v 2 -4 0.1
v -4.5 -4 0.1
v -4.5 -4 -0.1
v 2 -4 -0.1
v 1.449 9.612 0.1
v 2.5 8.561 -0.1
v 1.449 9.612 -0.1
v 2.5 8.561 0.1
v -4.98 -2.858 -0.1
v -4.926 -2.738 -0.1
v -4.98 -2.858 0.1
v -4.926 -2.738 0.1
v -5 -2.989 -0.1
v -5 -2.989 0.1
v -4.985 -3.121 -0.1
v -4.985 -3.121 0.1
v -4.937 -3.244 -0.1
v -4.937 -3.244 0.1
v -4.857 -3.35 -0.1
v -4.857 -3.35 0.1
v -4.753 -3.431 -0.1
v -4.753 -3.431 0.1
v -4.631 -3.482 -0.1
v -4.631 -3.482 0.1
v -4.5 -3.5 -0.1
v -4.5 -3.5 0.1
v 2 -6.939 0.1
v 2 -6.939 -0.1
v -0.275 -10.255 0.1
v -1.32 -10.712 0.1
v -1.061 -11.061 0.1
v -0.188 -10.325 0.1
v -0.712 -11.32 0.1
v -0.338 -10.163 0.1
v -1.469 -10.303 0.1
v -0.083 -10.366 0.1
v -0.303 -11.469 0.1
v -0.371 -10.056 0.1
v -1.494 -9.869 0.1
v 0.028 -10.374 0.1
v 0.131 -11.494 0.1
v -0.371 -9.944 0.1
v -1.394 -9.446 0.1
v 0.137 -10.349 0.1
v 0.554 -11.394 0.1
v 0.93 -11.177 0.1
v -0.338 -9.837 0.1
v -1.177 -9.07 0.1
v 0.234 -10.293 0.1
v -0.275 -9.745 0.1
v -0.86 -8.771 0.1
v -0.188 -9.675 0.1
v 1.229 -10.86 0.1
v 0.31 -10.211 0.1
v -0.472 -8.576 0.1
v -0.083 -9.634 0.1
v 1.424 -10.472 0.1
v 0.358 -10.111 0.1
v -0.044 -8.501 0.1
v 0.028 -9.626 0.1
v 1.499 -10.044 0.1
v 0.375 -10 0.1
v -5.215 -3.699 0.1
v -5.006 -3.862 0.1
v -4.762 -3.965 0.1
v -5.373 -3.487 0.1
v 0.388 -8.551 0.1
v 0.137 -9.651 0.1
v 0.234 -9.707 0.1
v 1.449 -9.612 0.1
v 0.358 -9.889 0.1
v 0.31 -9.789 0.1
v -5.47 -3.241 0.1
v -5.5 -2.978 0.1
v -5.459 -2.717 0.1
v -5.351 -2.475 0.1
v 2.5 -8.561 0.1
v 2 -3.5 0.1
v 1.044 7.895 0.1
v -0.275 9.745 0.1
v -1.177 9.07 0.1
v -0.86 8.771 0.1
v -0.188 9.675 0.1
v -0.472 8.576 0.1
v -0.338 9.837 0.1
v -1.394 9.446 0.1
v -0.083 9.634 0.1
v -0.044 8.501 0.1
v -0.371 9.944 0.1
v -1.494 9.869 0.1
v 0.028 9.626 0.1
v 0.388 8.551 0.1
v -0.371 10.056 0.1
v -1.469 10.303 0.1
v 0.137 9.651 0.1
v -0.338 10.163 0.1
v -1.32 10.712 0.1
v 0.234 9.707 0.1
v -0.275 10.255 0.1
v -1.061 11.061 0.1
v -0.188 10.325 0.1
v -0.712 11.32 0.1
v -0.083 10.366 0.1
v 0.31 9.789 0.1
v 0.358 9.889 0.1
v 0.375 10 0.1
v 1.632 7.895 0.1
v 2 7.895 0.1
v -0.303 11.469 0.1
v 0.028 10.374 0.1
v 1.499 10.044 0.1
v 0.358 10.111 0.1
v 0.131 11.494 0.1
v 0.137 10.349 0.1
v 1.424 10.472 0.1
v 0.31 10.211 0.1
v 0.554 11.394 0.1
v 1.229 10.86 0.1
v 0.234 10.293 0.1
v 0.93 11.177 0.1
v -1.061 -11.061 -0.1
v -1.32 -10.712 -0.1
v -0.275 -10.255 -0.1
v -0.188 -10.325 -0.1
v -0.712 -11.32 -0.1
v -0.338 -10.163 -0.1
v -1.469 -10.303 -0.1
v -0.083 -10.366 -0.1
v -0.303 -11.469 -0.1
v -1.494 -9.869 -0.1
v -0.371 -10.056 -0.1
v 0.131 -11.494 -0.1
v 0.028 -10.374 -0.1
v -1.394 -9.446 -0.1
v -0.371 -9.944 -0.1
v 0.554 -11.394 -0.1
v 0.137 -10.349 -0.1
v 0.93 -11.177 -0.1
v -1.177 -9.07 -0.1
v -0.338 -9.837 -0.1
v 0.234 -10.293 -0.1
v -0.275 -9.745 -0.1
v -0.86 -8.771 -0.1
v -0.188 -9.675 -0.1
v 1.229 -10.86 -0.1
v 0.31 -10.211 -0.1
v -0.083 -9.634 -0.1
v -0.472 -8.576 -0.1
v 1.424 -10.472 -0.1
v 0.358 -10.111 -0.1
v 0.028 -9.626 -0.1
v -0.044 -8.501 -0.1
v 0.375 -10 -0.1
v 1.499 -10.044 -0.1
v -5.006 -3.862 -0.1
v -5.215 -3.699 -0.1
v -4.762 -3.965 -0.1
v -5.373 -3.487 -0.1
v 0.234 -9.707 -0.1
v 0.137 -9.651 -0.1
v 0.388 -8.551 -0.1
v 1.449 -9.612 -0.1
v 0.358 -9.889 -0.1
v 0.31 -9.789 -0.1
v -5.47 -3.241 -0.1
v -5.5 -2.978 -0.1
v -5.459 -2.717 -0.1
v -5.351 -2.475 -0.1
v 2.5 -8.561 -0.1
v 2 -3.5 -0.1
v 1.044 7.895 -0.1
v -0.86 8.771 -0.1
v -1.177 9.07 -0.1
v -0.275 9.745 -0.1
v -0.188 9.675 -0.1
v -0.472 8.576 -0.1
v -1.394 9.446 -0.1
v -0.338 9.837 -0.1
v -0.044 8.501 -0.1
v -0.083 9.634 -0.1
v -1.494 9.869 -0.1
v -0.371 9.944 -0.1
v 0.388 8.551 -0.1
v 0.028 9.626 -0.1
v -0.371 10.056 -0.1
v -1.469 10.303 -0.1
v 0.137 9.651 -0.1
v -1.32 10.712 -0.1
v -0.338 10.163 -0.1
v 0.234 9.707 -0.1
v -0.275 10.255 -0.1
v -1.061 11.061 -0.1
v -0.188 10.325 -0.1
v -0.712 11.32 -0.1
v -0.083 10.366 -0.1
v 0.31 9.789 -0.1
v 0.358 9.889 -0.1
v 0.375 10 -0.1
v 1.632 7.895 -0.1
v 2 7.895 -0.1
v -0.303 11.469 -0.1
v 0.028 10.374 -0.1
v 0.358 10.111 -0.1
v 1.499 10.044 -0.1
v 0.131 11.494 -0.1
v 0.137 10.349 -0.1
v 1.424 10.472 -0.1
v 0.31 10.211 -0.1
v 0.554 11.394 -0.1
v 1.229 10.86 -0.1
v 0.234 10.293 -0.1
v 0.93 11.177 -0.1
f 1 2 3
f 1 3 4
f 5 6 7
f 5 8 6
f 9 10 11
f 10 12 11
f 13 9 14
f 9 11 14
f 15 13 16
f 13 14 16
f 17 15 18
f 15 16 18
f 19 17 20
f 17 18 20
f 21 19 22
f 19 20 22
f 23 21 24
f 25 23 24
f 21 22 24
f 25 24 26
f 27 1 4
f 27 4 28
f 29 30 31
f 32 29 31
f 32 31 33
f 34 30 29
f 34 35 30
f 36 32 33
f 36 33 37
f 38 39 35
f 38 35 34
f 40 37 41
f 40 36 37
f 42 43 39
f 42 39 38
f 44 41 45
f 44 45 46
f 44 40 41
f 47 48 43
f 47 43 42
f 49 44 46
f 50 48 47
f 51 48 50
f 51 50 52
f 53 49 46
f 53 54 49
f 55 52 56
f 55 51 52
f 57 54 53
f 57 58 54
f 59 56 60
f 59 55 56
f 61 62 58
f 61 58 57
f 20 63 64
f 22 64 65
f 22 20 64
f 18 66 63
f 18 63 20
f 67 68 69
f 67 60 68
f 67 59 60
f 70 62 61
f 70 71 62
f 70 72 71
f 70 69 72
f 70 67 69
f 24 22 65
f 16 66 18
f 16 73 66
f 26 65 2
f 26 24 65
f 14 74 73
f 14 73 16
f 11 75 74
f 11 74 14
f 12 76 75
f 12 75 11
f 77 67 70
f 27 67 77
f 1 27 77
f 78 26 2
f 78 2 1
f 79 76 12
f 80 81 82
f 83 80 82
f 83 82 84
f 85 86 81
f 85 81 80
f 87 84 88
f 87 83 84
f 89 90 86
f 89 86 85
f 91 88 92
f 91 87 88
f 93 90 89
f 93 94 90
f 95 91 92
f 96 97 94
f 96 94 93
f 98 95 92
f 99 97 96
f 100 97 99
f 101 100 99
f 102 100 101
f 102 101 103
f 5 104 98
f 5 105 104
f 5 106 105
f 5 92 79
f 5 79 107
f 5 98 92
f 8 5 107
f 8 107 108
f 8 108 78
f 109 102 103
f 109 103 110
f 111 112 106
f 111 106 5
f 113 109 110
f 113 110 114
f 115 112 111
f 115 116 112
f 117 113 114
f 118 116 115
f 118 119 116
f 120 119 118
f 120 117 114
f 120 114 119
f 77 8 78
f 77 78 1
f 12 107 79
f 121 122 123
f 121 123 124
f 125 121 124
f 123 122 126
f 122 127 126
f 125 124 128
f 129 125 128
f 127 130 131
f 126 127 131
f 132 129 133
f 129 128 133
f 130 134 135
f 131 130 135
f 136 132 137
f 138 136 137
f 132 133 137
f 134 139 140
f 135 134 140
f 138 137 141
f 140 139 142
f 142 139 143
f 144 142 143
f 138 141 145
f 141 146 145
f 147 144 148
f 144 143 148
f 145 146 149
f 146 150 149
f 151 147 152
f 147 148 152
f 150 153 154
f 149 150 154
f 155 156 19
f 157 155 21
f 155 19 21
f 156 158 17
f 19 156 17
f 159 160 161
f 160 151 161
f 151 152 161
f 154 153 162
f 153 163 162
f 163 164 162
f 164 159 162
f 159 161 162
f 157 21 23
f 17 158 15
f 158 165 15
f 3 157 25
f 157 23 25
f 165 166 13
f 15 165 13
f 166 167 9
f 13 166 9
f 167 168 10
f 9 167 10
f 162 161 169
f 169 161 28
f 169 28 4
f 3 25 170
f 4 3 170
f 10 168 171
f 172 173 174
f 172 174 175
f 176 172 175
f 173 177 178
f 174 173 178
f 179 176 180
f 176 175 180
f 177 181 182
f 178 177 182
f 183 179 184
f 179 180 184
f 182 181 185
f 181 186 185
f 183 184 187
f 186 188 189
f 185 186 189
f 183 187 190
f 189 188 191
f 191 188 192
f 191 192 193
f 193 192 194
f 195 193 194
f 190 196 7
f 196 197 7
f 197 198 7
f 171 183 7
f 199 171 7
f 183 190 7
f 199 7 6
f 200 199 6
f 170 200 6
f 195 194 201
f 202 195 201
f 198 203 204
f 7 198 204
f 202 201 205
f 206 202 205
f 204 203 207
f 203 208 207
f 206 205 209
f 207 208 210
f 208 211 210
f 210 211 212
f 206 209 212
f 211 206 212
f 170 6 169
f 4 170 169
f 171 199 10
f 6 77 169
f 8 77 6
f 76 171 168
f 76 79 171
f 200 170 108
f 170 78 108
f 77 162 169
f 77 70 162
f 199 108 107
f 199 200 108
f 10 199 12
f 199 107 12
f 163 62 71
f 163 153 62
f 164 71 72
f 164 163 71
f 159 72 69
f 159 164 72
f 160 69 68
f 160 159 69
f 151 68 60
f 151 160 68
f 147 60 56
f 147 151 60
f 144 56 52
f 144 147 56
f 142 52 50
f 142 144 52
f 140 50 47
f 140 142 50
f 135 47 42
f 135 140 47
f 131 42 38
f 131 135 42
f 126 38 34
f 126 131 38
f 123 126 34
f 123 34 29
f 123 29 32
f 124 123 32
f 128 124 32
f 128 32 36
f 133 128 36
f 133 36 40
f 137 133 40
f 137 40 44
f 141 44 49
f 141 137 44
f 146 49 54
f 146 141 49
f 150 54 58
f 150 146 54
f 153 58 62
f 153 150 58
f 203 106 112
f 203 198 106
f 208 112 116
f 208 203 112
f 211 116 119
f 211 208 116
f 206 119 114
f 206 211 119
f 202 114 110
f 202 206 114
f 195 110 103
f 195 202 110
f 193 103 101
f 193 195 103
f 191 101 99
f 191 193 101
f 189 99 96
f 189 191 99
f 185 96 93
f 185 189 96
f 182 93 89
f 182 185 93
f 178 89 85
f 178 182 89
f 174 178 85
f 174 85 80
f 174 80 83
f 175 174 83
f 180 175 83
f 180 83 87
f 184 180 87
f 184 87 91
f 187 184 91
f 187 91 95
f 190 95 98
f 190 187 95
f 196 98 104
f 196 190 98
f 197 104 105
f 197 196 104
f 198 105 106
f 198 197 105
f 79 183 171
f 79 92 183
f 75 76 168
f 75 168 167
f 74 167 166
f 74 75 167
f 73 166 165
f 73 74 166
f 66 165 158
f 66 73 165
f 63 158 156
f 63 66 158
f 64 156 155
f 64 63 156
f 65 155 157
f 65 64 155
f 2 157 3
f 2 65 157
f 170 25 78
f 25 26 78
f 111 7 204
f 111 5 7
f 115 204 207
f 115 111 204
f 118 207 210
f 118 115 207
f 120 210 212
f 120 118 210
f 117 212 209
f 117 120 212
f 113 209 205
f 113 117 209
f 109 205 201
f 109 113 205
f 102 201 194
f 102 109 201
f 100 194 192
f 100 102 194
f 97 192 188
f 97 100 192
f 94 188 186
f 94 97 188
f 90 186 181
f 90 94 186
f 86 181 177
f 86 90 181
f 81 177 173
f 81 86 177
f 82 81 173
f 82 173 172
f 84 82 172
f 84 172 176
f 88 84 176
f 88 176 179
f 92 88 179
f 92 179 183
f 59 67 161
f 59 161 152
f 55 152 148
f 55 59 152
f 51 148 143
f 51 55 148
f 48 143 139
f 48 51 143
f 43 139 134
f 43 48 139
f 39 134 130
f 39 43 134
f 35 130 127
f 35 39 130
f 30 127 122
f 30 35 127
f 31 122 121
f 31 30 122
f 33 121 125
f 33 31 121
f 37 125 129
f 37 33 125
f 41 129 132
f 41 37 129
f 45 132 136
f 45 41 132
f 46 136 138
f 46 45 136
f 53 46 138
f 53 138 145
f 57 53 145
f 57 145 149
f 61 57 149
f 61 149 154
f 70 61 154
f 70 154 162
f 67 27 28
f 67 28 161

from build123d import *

# Parameters (mm, degrees)
SKETCH1_R           = 0.375
BOSS_EXTRUDE1_DEPTH = 0.1


with BuildPart() as part:
    # Sketch1 → Boss-Extrude1 (new body, symmetric)
    with BuildSketch(Plane.XY):
        with BuildLine():
            Line((1.04409719, 7.895242639), (-5.351162932, -2.475098425))
            ThreePointArc((-5.351162932, -2.475098425), (-5.37318428, -3.487390206), (-4.5, -4))
            Line((-4.5, -4), (2, -4))
            Line((2, -4), (2, -6.939339828))
            Line((2, -6.939339828), (0.388228568, -8.551111261))
            ThreePointArc((0.388228568, -8.551111261), (-1.060660172, -11.060660172), (1.448888739, -9.611771432))
            Line((1.448888739, -9.611771432), (2.5, -8.560660172))
            Line((2.5, -8.560660172), (2.5, 8.560660172))
            Line((2.5, 8.560660172), (1.448888739, 9.611771432))
            ThreePointArc((1.448888739, 9.611771432), (-1.060660172, 11.060660172), (0.388228568, 8.551111261))
            Line((0.388228568, 8.551111261), (1.04409719, 7.895242639))
        make_face()
        with Locations((0, 10)):
            Circle(SKETCH1_R, mode=Mode.SUBTRACT)
        with Locations((0, -10)):
            Circle(SKETCH1_R, mode=Mode.SUBTRACT)
        with BuildLine():
            Line((1.631528786, 7.895242639), (-4.925581466, -2.737549213))
            ThreePointArc((-4.925581466, -2.737549213), (-4.93659214, -3.243695103), (-4.5, -3.5))
            Line((-4.5, -3.5), (2, -3.5))
            Line((2, -3.5), (2, 7.895242639))
            Line((2, 7.895242639), (1.631528786, 7.895242639))
        make_face(mode=Mode.SUBTRACT)
    extrude(amount=BOSS_EXTRUDE1_DEPTH, both=True)


solid = part.part
